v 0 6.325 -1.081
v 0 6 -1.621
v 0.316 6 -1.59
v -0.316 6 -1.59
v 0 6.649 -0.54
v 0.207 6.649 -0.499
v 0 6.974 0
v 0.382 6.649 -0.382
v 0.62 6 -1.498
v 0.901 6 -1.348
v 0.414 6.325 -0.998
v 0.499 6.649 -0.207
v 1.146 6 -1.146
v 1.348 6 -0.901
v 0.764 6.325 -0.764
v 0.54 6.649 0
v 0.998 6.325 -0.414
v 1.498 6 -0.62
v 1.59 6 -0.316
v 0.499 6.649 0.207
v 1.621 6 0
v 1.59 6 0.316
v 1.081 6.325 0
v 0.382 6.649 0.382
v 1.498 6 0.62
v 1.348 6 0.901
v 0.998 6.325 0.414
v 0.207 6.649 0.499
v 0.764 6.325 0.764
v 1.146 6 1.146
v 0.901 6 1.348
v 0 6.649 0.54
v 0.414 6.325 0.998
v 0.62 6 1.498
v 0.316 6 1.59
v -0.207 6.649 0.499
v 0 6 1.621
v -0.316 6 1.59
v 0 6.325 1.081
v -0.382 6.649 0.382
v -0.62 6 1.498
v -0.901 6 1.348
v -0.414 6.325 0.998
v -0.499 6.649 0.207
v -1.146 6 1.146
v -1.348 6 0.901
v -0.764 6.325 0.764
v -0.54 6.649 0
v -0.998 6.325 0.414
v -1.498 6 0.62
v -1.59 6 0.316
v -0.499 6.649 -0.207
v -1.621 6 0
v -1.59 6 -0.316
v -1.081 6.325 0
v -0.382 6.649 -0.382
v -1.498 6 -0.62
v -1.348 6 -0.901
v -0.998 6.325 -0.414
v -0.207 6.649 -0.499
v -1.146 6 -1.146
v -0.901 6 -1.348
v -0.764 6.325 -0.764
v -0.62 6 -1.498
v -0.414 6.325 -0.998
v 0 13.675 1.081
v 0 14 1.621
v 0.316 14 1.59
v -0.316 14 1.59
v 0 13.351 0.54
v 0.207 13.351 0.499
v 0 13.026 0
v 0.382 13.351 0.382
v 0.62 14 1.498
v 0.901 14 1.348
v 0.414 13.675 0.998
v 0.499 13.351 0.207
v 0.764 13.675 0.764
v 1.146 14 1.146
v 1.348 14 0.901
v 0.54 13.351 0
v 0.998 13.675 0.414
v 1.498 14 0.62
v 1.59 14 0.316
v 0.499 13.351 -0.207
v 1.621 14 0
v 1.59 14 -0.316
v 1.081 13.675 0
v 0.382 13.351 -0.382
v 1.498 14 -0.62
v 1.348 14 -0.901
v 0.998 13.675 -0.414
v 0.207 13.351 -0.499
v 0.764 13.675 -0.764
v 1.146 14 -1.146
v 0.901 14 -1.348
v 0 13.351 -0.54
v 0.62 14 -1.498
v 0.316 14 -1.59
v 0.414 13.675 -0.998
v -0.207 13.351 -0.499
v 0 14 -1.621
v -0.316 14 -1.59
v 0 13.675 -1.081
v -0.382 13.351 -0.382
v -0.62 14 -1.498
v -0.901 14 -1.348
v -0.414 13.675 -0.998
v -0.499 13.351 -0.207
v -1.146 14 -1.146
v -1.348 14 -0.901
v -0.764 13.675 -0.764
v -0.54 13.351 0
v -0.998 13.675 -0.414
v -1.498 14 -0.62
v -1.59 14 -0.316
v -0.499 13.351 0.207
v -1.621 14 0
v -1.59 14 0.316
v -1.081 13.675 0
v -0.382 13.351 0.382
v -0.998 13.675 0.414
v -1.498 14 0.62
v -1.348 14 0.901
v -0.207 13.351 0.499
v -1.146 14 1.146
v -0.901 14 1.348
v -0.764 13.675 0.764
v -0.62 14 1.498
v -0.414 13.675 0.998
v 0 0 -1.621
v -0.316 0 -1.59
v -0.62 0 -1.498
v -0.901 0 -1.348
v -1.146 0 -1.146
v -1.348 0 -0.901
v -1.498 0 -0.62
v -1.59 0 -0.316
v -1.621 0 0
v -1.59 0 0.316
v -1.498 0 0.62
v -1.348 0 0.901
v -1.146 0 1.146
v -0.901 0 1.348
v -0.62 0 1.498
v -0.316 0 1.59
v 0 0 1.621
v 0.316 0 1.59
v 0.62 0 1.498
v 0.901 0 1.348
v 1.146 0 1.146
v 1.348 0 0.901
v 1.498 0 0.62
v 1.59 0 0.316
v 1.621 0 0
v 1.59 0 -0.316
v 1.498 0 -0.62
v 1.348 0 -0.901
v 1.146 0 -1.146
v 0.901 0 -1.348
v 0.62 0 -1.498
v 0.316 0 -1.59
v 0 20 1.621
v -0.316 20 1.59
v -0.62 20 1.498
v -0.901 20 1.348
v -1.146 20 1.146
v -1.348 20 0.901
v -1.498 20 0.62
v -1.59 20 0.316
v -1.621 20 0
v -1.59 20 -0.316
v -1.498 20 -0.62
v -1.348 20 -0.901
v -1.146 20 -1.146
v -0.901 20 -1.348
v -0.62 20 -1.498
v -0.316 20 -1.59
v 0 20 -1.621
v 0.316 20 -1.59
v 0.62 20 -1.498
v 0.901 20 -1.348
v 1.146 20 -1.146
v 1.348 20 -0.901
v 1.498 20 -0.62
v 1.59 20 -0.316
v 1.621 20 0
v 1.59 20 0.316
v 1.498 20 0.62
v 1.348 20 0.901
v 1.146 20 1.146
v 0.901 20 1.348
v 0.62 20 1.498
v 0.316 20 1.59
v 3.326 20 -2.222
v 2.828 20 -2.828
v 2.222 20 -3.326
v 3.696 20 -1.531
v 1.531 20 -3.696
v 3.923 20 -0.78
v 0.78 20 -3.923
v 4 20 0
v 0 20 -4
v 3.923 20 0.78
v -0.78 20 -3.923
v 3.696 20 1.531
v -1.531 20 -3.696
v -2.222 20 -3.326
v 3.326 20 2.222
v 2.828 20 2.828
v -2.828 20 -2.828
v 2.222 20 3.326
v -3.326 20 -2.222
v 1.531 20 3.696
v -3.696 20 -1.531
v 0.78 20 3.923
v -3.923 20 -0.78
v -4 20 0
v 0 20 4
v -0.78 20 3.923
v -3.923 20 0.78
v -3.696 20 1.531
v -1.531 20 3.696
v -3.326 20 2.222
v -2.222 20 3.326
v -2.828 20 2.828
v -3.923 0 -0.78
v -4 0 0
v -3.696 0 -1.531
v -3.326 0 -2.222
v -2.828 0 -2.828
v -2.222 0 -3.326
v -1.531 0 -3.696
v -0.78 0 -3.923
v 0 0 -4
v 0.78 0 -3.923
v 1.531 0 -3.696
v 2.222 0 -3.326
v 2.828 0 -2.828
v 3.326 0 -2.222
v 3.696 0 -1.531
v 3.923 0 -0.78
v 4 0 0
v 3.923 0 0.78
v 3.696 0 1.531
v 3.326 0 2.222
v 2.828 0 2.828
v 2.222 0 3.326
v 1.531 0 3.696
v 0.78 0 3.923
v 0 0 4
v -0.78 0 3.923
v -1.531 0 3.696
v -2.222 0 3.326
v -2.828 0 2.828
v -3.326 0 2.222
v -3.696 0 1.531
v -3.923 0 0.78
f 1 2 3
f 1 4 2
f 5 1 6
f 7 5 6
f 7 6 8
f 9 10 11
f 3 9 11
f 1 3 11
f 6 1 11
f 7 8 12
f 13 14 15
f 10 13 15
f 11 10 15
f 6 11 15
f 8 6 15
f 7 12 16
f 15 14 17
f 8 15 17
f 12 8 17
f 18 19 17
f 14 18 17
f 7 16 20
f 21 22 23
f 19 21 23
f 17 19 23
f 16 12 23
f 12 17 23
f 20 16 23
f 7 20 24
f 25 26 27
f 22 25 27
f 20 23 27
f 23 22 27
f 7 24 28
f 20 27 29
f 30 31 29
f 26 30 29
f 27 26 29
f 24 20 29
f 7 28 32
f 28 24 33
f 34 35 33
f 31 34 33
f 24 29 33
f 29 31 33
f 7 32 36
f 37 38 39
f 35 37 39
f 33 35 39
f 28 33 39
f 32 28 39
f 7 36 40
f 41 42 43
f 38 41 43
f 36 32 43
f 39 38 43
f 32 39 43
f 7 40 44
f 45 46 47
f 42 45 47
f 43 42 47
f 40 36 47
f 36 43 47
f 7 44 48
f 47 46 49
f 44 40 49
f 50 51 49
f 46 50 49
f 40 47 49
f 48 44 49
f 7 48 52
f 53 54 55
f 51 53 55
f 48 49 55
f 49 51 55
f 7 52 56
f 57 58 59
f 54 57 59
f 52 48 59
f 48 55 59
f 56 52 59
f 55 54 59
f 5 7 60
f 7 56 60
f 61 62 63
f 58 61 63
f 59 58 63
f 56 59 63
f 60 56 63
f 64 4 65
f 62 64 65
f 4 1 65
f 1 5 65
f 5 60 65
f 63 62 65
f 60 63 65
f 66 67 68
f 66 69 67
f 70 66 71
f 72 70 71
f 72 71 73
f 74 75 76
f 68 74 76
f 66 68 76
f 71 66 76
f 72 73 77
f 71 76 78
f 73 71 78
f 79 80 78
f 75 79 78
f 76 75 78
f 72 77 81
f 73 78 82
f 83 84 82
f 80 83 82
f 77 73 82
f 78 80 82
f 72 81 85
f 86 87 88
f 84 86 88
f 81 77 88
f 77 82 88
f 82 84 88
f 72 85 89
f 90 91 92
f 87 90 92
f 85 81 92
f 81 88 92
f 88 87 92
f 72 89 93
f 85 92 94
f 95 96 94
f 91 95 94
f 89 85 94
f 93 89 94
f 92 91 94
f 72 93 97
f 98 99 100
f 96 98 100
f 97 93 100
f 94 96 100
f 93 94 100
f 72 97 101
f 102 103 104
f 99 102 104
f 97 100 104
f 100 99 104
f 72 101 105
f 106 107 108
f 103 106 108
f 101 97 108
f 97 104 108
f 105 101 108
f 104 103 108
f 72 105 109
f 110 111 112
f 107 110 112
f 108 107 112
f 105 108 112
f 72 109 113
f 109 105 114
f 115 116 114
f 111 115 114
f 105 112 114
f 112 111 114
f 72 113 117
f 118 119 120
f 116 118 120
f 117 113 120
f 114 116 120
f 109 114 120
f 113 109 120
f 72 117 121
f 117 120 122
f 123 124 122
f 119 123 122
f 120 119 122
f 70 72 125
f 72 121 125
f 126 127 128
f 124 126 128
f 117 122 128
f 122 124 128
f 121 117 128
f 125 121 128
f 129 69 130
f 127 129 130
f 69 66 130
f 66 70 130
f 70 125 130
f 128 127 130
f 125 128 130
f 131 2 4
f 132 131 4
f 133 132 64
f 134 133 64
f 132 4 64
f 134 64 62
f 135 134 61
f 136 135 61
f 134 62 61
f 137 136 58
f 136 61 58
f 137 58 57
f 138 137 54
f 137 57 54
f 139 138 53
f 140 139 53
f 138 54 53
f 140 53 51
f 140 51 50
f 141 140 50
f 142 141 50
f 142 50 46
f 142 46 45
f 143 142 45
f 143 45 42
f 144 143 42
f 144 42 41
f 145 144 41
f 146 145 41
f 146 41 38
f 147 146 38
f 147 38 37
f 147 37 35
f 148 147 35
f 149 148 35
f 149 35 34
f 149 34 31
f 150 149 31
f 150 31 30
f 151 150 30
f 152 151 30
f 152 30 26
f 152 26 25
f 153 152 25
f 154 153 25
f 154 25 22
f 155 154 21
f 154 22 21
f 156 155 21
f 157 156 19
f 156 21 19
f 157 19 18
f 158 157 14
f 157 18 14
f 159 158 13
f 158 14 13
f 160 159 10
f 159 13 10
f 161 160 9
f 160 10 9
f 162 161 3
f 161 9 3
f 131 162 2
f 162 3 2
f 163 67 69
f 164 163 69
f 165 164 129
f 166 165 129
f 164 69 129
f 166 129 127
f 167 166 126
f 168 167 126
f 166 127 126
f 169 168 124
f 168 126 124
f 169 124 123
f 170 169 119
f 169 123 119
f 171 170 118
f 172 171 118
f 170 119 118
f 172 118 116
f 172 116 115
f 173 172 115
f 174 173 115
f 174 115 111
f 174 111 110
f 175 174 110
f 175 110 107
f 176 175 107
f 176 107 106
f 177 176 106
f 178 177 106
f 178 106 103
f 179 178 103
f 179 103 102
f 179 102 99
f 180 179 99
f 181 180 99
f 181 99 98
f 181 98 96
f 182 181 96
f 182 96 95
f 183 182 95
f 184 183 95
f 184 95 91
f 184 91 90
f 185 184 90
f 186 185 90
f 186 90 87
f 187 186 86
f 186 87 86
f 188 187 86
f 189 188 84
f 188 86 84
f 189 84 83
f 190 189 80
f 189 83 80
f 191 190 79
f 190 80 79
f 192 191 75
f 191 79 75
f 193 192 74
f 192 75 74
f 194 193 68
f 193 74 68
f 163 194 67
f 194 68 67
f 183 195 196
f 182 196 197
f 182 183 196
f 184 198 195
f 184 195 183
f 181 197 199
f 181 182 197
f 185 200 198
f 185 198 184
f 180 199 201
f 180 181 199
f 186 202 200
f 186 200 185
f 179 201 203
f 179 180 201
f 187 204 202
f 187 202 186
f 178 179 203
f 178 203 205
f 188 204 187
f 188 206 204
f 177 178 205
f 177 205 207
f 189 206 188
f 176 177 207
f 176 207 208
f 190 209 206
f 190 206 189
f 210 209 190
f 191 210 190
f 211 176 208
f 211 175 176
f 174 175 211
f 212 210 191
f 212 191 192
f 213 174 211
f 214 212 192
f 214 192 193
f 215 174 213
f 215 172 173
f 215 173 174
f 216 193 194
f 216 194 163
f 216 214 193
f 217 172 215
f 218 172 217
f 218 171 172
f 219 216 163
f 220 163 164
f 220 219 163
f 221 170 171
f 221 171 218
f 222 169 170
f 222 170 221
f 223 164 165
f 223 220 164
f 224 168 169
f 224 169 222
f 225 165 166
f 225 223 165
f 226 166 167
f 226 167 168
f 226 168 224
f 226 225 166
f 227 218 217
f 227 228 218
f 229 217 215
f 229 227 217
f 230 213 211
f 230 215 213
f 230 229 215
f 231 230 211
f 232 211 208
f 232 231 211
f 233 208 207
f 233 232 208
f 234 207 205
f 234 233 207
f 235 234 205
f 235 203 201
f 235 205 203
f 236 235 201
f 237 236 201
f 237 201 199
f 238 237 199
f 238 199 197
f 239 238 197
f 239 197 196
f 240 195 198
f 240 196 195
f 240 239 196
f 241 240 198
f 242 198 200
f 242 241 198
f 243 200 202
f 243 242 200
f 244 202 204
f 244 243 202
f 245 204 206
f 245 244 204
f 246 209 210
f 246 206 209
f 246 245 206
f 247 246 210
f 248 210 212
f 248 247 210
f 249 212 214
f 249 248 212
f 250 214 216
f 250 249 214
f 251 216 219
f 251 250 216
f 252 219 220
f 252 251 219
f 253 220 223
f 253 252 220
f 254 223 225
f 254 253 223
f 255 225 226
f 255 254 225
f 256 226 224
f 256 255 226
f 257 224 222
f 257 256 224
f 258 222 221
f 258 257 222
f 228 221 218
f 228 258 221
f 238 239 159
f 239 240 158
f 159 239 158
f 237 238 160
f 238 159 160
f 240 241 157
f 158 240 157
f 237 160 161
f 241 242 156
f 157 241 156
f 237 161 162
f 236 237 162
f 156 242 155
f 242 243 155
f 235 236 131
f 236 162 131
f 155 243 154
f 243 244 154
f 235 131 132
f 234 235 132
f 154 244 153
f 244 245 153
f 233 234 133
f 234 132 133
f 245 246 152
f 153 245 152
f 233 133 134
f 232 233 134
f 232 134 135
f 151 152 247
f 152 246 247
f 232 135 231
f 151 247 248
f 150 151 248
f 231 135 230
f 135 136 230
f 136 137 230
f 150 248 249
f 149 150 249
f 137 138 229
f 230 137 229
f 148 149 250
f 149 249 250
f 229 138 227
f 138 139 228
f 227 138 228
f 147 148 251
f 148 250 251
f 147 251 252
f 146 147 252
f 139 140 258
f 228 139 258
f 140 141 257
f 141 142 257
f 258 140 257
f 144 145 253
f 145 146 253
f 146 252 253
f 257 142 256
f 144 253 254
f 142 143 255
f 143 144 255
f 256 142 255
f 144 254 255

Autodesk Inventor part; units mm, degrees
ref_plane "YZ Plane" through (0, 0, 0) normal (1, 0, 0) x (0, 1, 0)
ref_plane "XZ Plane" through (0, 0, 0) normal (0, 1, 0) x (-1, 0, 0)
ref_plane "XY Plane" through (0, 0, 0) normal (0, 0, 1) x (1, 0, 0)
sketch "スケッチ1" plane through (0, 0, 0) normal (0, 1, 0) x (-1, 0, 0)
  circle A0 centre (0, 0) radius 4
  dimension "d0" = 8
extrude "押し出し1" add sketch "スケッチ1" along normal blind 20
sketch "スケッチ2" plane through (0, 20, 0) normal (0, 1, 0) x (1, 0, 0)
  point P0 (0, 0)
  point P1 (0, 0)
hole "穴1" at (0, 20, 0) direction (0, -1, 0) diameter 3.242 depth 6 tip angle 118 thread size "M4x0.7" class "6H" standard "ISO Metric profile"
sketch "スケッチ3" plane through (0, 0, 0) normal (0, -1, 0) x (1, 0, 0)
  circle A0 centre (0, 0) radius 1.621 projected
hole "穴2" at (0, 0, 0) direction (0, 1, 0) diameter 3.242 depth 6 tip angle 118 thread size "M4x0.7" class "6H" standard "ISO Metric profile"
properties part number "base_part3" material "アルミニウム 6061"
